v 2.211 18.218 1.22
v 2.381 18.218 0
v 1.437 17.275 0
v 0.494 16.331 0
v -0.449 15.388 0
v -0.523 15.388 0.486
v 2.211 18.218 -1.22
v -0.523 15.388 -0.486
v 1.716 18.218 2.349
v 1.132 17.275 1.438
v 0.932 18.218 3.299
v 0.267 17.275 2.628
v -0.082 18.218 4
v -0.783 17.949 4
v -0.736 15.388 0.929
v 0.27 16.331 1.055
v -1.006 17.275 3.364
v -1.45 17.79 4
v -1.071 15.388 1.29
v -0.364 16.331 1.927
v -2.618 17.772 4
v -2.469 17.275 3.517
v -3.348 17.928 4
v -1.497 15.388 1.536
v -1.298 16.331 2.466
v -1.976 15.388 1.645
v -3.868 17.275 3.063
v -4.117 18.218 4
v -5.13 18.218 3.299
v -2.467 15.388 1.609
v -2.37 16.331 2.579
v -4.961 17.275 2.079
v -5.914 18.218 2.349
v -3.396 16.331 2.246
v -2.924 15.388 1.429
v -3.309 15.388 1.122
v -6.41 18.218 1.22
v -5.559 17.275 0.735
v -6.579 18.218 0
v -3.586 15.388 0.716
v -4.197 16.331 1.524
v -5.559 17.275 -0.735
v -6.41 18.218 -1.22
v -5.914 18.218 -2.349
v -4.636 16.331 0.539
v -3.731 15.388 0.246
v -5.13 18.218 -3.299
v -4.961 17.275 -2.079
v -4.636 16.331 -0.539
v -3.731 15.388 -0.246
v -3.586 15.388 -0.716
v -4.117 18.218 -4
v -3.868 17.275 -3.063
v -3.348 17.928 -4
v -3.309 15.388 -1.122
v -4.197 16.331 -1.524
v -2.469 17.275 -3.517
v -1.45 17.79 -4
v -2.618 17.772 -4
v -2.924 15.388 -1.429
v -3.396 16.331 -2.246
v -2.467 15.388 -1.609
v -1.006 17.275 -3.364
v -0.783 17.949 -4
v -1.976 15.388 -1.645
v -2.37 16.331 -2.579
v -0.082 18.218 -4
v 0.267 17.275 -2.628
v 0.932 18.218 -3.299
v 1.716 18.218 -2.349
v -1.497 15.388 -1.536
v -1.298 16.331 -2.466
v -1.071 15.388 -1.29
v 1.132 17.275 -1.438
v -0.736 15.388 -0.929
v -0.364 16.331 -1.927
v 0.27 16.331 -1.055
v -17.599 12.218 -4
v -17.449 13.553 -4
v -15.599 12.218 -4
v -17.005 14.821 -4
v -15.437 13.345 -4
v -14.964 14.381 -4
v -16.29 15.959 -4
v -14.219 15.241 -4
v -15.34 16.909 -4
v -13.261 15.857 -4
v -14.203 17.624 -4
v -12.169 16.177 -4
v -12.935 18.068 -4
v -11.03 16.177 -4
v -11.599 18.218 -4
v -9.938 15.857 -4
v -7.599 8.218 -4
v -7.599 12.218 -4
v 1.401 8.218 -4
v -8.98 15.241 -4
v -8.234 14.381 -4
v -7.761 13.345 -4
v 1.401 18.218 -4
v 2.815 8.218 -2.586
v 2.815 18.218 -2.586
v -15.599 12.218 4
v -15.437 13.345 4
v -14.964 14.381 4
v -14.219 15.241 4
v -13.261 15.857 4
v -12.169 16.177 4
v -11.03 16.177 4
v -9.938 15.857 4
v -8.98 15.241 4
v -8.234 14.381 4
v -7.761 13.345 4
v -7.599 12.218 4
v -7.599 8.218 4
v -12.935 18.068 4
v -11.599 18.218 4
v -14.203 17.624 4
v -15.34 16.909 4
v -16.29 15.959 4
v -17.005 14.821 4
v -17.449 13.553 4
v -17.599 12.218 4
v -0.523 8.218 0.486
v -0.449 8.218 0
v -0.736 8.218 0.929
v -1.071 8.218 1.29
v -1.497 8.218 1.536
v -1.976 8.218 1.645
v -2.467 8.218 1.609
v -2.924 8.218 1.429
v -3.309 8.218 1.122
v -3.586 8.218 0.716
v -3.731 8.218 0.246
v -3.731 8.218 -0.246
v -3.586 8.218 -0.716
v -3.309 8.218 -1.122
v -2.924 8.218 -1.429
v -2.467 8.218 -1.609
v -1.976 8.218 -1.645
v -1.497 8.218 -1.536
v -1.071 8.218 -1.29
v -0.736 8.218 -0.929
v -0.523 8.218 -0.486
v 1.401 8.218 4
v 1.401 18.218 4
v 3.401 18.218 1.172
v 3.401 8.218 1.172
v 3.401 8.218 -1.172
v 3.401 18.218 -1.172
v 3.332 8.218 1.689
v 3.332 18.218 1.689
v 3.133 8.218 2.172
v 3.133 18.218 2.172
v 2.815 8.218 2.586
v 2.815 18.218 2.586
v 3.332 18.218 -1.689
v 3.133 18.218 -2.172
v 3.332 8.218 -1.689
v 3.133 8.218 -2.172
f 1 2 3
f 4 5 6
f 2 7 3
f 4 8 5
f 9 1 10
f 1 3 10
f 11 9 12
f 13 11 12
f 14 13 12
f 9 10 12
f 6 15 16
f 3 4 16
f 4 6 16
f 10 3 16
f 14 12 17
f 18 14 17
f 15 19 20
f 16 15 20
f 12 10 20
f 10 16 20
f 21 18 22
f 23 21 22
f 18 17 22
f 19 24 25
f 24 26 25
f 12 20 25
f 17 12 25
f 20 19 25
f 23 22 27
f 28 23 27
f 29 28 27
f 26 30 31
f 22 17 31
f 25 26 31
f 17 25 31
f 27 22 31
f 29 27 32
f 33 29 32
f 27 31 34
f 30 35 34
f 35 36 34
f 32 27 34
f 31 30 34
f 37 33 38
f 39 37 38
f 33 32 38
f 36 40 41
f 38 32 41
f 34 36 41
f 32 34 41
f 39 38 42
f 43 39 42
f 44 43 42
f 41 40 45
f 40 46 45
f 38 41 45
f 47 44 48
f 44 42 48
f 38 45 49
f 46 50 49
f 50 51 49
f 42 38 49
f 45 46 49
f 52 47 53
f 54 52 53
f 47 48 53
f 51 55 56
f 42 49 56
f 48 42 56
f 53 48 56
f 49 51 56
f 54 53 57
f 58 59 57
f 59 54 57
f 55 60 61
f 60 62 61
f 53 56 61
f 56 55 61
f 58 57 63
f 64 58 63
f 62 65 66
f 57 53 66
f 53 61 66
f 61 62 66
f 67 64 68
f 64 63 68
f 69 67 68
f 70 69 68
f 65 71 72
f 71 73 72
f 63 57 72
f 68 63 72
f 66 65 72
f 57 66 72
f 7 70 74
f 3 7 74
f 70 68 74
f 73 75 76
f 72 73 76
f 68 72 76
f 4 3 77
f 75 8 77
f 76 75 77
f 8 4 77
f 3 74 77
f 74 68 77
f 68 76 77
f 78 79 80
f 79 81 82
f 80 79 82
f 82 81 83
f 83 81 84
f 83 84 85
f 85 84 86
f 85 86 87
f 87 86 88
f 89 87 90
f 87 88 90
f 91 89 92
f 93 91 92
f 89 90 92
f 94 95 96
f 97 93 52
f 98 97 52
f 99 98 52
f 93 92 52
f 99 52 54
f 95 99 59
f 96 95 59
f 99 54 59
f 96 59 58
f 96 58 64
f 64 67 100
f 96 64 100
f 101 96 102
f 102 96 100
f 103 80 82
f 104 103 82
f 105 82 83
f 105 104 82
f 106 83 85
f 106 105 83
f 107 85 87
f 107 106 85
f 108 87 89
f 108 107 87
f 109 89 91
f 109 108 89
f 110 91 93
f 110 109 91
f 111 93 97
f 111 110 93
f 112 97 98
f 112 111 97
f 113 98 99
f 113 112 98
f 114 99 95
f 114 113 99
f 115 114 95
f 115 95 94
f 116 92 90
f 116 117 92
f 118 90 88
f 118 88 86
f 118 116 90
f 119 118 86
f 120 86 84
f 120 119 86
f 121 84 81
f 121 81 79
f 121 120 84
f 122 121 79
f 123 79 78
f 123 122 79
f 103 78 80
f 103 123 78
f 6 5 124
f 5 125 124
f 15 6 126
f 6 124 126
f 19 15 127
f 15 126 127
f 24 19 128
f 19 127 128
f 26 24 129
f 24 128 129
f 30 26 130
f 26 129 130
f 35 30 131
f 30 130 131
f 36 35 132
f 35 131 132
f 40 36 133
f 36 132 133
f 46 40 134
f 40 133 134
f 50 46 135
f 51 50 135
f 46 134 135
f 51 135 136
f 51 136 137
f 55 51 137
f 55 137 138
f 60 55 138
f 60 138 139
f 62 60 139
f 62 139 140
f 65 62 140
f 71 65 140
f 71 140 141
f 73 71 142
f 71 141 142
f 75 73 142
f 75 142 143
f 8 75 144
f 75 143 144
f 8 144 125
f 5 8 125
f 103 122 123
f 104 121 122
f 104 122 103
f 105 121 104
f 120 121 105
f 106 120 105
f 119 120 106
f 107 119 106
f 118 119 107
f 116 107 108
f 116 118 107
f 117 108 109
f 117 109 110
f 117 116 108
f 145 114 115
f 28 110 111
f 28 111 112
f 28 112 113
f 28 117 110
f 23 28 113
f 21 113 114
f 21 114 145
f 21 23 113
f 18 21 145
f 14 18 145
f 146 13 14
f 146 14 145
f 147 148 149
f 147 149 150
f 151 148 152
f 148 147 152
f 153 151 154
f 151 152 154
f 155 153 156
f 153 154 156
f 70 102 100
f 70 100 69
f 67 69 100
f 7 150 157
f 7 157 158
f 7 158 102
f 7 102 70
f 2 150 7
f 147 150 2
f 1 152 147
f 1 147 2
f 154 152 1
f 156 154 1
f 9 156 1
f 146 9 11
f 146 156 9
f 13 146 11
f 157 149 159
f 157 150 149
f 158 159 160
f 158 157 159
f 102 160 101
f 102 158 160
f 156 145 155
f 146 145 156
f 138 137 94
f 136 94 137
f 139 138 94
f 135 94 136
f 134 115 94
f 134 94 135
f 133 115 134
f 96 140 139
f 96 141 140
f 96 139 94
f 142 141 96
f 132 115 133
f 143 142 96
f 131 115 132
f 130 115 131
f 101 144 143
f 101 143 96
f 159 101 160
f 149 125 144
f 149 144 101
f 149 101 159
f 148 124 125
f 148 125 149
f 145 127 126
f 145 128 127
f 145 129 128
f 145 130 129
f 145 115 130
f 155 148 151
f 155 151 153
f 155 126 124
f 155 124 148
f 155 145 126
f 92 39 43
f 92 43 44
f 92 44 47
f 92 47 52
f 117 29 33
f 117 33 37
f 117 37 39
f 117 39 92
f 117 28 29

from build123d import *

# Parameters (mm, degrees)
F1_DEPTH       = 4
F3_D           = 3.3
F3_CSINK_D     = 8.96
F3_CSINK_ANGLE = 90
F4_SIZE        = 2
F5_R           = 2


with BuildPart() as f1:
    # F0 (on Top) → F1 (new body, symmetric)
    with BuildSketch(Plane.XY):
        with BuildLine():
            ThreePointArc((-15.5993879735, 12.218022719), (-11.5993879735, 16.218022719), (-7.5993879735, 12.218022719))
            Line((-7.5993879735, 12.218022719), (-7.5993879735, 8.218022719))
            Line((-7.5993879735, 8.218022719), (3.4006120265, 8.218022719))
            Line((3.4006120265, 8.218022719), (3.4006120265, 18.218022719))
            Line((3.4006120265, 18.218022719), (-11.5993879735, 18.218022719))
            ThreePointArc((-11.5993879735, 18.218022719), (-15.8420286607, 16.4606634061), (-17.5993879735, 12.218022719))
            Line((-17.5993879735, 12.218022719), (-15.5993879735, 12.218022719))
        make_face()
    extrude(amount=F1_DEPTH, both=True)

    # F3 (through all)
    with Locations(Plane(origin=(0, 18.218022719, 0), x_dir=(-1, 0, 0), z_dir=(0, 1, 0))):
        with Locations((2.0993879735, 0)):
            CounterSinkHole(F3_D / 2, F3_CSINK_D / 2, counter_sink_angle=F3_CSINK_ANGLE)

    # F4
    f4_edges = [f1.edges().sort_by_distance(p)[0] for p in [
        (3.400612, 13.218023, 4),
        (3.400612, 13.218023, -4),
    ]]
    chamfer(f4_edges, length=F4_SIZE)

    # F5
    f5_edges = [f1.edges().sort_by_distance(p)[0] for p in [
        (3.400612, 13.218023, 2),
        (3.400612, 13.218023, -2),
    ]]
    fillet(f5_edges, radius=F5_R)


solid = f1.part
